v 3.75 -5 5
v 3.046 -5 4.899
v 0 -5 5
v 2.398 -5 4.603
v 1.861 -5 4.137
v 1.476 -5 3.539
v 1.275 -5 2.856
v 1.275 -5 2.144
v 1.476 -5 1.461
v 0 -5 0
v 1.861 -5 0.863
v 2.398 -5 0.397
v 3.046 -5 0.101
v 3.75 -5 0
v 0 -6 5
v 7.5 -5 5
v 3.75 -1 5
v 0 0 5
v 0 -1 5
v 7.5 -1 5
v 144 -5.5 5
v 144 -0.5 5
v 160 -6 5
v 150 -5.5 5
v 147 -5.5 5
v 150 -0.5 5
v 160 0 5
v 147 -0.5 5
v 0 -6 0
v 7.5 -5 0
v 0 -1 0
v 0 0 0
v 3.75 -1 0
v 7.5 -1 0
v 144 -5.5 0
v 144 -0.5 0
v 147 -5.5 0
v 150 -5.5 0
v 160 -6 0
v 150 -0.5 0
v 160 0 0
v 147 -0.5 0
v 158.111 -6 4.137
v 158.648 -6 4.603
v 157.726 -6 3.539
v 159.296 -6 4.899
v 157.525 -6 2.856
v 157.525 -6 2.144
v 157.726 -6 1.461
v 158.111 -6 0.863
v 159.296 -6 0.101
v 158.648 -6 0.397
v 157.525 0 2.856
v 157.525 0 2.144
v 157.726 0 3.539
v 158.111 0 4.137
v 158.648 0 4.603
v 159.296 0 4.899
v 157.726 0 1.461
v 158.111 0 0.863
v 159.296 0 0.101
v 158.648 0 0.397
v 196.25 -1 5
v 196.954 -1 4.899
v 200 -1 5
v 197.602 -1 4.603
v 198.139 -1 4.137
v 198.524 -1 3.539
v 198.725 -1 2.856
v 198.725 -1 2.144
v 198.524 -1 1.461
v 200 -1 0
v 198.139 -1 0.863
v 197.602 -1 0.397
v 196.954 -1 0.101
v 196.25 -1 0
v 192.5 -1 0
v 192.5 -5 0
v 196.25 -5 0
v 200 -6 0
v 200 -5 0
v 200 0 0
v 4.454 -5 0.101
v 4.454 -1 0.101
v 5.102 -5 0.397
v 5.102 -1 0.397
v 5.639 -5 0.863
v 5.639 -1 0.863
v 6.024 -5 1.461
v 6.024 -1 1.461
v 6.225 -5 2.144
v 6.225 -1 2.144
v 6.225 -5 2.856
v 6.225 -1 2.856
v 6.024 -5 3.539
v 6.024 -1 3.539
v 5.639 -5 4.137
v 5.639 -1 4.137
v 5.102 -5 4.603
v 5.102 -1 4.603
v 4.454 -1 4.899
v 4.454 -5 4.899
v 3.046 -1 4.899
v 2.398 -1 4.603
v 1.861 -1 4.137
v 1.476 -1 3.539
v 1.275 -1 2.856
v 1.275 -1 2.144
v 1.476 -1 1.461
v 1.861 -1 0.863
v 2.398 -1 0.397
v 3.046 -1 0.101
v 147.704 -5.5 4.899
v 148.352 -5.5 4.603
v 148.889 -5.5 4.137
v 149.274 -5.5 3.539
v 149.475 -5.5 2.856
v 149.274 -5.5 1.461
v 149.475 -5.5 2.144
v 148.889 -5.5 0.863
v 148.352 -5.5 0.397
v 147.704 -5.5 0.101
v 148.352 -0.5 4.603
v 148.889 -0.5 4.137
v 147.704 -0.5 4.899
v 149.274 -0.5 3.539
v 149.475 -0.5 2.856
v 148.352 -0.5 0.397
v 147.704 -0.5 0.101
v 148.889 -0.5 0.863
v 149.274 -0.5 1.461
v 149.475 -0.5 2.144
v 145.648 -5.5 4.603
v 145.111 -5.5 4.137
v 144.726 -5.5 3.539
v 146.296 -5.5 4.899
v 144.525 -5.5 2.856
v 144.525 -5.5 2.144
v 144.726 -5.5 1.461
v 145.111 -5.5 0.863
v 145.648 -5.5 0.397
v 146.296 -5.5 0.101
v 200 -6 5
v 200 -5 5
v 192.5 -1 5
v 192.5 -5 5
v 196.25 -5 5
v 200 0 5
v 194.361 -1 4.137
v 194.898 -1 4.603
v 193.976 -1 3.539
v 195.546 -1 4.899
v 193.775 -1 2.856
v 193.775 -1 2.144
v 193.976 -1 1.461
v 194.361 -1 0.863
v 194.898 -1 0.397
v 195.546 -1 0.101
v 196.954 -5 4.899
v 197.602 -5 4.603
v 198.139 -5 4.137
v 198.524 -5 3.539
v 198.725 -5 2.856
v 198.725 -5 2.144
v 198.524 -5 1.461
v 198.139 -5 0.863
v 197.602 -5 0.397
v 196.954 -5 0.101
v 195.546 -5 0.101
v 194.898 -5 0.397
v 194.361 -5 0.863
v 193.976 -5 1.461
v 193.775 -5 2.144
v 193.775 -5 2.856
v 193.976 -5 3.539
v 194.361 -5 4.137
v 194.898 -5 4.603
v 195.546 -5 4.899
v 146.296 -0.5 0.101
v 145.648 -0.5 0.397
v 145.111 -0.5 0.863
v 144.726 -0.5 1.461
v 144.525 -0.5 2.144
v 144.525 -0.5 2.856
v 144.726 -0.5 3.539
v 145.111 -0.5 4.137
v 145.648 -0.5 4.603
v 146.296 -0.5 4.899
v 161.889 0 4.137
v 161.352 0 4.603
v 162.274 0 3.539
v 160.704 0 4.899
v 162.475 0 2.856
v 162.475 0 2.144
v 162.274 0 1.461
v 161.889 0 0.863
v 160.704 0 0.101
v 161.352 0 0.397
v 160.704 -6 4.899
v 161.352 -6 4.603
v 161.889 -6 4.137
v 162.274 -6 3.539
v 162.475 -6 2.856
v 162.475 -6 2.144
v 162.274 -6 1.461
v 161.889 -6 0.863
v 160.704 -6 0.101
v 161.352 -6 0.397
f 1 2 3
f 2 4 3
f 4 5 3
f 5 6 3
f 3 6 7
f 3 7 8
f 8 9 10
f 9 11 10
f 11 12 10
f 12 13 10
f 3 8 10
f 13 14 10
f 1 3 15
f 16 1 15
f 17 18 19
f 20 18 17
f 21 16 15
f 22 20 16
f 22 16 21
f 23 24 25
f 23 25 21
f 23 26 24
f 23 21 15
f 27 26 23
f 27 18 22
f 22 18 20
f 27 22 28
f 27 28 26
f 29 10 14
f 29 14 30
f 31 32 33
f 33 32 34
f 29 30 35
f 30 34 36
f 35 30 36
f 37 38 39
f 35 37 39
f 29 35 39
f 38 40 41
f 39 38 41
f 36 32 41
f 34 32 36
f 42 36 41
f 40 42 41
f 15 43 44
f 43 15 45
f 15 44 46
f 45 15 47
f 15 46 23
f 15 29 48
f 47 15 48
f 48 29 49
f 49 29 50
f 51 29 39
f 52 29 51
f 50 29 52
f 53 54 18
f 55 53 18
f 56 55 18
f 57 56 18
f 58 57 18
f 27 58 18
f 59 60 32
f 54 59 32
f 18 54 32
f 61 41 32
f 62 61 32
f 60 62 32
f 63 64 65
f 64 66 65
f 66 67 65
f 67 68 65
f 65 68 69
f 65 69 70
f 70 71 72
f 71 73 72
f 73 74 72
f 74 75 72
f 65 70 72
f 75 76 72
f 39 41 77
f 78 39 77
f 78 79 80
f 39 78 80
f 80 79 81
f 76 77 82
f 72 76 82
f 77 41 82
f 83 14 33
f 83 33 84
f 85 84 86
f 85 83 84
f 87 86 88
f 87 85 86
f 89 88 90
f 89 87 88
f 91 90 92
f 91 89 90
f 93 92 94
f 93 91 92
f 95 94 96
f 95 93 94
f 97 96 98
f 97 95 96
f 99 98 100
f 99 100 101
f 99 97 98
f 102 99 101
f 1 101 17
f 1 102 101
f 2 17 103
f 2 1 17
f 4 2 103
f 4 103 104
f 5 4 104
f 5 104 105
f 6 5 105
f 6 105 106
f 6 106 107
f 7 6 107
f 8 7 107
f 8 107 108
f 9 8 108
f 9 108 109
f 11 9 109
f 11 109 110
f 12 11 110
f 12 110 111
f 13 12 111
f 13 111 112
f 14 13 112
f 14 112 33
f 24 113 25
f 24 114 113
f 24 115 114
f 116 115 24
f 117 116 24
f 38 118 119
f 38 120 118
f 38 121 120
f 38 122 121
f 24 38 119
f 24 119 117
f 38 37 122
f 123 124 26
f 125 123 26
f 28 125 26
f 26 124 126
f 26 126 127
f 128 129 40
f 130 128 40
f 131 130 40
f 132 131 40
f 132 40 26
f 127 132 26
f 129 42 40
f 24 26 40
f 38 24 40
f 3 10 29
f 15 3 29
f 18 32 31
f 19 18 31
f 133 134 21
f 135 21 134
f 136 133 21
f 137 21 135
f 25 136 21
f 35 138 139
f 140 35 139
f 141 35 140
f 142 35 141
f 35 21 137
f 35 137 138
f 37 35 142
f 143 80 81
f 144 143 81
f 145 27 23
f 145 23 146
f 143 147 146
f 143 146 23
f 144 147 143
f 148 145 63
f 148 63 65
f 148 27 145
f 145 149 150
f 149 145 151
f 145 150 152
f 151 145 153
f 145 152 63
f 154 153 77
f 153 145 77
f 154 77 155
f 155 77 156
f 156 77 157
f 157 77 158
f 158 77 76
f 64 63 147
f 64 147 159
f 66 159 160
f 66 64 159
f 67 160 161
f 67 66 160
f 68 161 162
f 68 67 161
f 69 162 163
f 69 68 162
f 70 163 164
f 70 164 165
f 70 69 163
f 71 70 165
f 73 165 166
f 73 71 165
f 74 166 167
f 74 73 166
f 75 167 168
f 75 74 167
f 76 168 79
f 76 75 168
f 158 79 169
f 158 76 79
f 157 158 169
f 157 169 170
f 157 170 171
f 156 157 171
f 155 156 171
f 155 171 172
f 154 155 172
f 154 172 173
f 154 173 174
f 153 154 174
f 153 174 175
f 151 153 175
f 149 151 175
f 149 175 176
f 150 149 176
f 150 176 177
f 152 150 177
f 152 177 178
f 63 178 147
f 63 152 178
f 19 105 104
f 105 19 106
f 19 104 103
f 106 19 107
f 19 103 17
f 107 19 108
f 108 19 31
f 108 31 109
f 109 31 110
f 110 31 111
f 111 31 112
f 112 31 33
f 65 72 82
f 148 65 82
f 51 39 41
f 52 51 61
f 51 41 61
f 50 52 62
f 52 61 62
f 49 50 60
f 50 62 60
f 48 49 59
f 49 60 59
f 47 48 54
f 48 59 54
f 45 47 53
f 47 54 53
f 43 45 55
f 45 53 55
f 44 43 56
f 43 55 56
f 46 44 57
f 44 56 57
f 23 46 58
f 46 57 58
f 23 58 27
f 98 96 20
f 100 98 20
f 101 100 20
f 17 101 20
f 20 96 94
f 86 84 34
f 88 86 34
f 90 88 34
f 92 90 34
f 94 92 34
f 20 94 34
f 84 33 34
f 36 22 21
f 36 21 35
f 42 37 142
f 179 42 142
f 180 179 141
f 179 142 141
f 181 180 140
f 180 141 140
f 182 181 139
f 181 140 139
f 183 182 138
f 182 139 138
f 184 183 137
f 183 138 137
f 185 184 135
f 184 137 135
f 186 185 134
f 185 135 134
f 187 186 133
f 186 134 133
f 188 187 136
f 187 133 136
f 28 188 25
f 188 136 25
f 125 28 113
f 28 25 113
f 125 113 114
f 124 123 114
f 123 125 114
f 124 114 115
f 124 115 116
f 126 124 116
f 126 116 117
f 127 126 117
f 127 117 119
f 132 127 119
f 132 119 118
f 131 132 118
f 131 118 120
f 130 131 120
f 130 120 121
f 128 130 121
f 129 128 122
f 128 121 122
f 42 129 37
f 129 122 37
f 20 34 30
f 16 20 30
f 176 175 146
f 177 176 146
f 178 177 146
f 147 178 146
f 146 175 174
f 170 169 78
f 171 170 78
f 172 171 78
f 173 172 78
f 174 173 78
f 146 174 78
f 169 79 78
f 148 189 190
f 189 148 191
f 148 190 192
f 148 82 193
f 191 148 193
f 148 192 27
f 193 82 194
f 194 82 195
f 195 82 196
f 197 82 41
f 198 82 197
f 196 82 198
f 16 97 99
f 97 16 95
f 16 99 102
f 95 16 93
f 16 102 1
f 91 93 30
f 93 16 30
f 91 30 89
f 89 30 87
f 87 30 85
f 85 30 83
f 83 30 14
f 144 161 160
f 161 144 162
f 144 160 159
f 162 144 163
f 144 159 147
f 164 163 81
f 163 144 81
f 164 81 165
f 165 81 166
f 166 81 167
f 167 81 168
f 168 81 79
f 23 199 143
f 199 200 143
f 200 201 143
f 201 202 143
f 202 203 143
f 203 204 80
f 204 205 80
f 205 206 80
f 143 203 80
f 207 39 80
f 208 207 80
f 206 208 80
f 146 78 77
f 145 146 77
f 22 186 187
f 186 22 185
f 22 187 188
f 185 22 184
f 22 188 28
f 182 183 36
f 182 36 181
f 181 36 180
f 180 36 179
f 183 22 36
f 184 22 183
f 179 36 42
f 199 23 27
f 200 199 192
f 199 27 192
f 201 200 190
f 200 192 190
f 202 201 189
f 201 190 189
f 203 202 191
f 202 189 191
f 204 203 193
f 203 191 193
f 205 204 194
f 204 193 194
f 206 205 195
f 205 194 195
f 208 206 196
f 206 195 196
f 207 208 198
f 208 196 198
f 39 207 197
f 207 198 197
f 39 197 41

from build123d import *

# Parameters (mm, degrees)
BOSS_EXTRUDE1_DEPTH = 5
SKETCH2_R           = 2.5
BOSS_EXTRUDE2_DEPTH = 5
SKETCH4_R           = 2.5
BOSS_EXTRUDE3_DEPTH = 5
SKETCH8_W           = 6
SKETCH8_H           = 6
CUT_EXTRUDE9_DEPTH  = 2.5
BOSS_EXTRUDE4_REACH = 202.138
SKETCH9_R           = 2.5
SKETCH10_R          = 2.5
CUT_EXTRUDE10_DEPTH = 201.152441904


with BuildPart() as part:
    # Sketch1 → Boss-Extrude1 (new body)
    with BuildSketch(Plane.XY):
        Polygon((200, 0), (0, 0), (0, -1), (7.5, -1), (7.5, -5), (0, -5), (0, -6), (200, -6), (200, -5), (192.5, -5), (192.5, -1), (200, -1), align=None)
    extrude(amount=BOSS_EXTRUDE1_DEPTH)

    # Sketch2 → Boss-Extrude2 (add)
    with BuildSketch(Plane.XZ.offset(6)):
        with Locations(Location((3.75, 2.5, 0), (0, 0, 270))):
            Circle(SKETCH2_R)
    extrude(amount=-BOSS_EXTRUDE2_DEPTH)

    # Sketch4 → Boss-Extrude3 (add)
    with BuildSketch(Plane(origin=(0, 0, 0), x_dir=(1, 0, 0), z_dir=(0, 1, 0))):
        with Locations(Location((196.25, -2.5, 0), (0, 0, 270))):
            Circle(SKETCH4_R)
    extrude(amount=-BOSS_EXTRUDE3_DEPTH)

    # Sketch8 → Cut-Extrude9 (cut, symmetric)
    with BuildSketch(Plane(origin=(0, -3, 0), x_dir=(1, 0, 0), z_dir=(0, 1, 0))):
        with Locations((147, -3)):
            Rectangle(SKETCH8_W, SKETCH8_H)
    extrude(amount=CUT_EXTRUDE9_DEPTH, both=True, mode=Mode.SUBTRACT)

    # Sketch9 → Boss-Extrude4 (add, up to next)
    with BuildSketch(Plane(origin=(0, -5.5, 0), x_dir=(1, 0, 0), z_dir=(0, 1, 0)), mode=Mode.PRIVATE) as boss_extrude4_sk1:
        with Locations(Location((147, -2.5, 0), (0, 0, 90))):
            Circle(SKETCH9_R)
    boss_extrude4_tool1 = extrude(boss_extrude4_sk1.sketch, amount=BOSS_EXTRUDE4_REACH, mode=Mode.PRIVATE) - part.part
    add(boss_extrude4_tool1.solids().sort_by_distance((147, -5.5, 2.5))[0])

    # Sketch10 → Cut-Extrude10 (cut, through all)
    with BuildSketch(Plane(origin=(0, 0, 0), x_dir=(1, 0, 0), z_dir=(0, 1, 0))):
        with Locations((160, -2.5)):
            Circle(SKETCH10_R)
    extrude(amount=-CUT_EXTRUDE10_DEPTH, mode=Mode.SUBTRACT)


with BuildPart() as cut_extrude10_piece_1:
    # of the separate pieces the step leaves, piece 1, a body of its own (cut_extrude10_pieces)
    add(part.part.solids().sort_by_distance((0, -6, 0))[0])


with BuildPart() as cut_extrude10_piece_2:
    # of the separate pieces the step leaves, piece 2, a body of its own (cut_extrude10_pieces)
    add(part.part.solids().sort_by_distance((200, 0, 0))[0])


solid = Compound([cut_extrude10_piece_1.part, cut_extrude10_piece_2.part])
